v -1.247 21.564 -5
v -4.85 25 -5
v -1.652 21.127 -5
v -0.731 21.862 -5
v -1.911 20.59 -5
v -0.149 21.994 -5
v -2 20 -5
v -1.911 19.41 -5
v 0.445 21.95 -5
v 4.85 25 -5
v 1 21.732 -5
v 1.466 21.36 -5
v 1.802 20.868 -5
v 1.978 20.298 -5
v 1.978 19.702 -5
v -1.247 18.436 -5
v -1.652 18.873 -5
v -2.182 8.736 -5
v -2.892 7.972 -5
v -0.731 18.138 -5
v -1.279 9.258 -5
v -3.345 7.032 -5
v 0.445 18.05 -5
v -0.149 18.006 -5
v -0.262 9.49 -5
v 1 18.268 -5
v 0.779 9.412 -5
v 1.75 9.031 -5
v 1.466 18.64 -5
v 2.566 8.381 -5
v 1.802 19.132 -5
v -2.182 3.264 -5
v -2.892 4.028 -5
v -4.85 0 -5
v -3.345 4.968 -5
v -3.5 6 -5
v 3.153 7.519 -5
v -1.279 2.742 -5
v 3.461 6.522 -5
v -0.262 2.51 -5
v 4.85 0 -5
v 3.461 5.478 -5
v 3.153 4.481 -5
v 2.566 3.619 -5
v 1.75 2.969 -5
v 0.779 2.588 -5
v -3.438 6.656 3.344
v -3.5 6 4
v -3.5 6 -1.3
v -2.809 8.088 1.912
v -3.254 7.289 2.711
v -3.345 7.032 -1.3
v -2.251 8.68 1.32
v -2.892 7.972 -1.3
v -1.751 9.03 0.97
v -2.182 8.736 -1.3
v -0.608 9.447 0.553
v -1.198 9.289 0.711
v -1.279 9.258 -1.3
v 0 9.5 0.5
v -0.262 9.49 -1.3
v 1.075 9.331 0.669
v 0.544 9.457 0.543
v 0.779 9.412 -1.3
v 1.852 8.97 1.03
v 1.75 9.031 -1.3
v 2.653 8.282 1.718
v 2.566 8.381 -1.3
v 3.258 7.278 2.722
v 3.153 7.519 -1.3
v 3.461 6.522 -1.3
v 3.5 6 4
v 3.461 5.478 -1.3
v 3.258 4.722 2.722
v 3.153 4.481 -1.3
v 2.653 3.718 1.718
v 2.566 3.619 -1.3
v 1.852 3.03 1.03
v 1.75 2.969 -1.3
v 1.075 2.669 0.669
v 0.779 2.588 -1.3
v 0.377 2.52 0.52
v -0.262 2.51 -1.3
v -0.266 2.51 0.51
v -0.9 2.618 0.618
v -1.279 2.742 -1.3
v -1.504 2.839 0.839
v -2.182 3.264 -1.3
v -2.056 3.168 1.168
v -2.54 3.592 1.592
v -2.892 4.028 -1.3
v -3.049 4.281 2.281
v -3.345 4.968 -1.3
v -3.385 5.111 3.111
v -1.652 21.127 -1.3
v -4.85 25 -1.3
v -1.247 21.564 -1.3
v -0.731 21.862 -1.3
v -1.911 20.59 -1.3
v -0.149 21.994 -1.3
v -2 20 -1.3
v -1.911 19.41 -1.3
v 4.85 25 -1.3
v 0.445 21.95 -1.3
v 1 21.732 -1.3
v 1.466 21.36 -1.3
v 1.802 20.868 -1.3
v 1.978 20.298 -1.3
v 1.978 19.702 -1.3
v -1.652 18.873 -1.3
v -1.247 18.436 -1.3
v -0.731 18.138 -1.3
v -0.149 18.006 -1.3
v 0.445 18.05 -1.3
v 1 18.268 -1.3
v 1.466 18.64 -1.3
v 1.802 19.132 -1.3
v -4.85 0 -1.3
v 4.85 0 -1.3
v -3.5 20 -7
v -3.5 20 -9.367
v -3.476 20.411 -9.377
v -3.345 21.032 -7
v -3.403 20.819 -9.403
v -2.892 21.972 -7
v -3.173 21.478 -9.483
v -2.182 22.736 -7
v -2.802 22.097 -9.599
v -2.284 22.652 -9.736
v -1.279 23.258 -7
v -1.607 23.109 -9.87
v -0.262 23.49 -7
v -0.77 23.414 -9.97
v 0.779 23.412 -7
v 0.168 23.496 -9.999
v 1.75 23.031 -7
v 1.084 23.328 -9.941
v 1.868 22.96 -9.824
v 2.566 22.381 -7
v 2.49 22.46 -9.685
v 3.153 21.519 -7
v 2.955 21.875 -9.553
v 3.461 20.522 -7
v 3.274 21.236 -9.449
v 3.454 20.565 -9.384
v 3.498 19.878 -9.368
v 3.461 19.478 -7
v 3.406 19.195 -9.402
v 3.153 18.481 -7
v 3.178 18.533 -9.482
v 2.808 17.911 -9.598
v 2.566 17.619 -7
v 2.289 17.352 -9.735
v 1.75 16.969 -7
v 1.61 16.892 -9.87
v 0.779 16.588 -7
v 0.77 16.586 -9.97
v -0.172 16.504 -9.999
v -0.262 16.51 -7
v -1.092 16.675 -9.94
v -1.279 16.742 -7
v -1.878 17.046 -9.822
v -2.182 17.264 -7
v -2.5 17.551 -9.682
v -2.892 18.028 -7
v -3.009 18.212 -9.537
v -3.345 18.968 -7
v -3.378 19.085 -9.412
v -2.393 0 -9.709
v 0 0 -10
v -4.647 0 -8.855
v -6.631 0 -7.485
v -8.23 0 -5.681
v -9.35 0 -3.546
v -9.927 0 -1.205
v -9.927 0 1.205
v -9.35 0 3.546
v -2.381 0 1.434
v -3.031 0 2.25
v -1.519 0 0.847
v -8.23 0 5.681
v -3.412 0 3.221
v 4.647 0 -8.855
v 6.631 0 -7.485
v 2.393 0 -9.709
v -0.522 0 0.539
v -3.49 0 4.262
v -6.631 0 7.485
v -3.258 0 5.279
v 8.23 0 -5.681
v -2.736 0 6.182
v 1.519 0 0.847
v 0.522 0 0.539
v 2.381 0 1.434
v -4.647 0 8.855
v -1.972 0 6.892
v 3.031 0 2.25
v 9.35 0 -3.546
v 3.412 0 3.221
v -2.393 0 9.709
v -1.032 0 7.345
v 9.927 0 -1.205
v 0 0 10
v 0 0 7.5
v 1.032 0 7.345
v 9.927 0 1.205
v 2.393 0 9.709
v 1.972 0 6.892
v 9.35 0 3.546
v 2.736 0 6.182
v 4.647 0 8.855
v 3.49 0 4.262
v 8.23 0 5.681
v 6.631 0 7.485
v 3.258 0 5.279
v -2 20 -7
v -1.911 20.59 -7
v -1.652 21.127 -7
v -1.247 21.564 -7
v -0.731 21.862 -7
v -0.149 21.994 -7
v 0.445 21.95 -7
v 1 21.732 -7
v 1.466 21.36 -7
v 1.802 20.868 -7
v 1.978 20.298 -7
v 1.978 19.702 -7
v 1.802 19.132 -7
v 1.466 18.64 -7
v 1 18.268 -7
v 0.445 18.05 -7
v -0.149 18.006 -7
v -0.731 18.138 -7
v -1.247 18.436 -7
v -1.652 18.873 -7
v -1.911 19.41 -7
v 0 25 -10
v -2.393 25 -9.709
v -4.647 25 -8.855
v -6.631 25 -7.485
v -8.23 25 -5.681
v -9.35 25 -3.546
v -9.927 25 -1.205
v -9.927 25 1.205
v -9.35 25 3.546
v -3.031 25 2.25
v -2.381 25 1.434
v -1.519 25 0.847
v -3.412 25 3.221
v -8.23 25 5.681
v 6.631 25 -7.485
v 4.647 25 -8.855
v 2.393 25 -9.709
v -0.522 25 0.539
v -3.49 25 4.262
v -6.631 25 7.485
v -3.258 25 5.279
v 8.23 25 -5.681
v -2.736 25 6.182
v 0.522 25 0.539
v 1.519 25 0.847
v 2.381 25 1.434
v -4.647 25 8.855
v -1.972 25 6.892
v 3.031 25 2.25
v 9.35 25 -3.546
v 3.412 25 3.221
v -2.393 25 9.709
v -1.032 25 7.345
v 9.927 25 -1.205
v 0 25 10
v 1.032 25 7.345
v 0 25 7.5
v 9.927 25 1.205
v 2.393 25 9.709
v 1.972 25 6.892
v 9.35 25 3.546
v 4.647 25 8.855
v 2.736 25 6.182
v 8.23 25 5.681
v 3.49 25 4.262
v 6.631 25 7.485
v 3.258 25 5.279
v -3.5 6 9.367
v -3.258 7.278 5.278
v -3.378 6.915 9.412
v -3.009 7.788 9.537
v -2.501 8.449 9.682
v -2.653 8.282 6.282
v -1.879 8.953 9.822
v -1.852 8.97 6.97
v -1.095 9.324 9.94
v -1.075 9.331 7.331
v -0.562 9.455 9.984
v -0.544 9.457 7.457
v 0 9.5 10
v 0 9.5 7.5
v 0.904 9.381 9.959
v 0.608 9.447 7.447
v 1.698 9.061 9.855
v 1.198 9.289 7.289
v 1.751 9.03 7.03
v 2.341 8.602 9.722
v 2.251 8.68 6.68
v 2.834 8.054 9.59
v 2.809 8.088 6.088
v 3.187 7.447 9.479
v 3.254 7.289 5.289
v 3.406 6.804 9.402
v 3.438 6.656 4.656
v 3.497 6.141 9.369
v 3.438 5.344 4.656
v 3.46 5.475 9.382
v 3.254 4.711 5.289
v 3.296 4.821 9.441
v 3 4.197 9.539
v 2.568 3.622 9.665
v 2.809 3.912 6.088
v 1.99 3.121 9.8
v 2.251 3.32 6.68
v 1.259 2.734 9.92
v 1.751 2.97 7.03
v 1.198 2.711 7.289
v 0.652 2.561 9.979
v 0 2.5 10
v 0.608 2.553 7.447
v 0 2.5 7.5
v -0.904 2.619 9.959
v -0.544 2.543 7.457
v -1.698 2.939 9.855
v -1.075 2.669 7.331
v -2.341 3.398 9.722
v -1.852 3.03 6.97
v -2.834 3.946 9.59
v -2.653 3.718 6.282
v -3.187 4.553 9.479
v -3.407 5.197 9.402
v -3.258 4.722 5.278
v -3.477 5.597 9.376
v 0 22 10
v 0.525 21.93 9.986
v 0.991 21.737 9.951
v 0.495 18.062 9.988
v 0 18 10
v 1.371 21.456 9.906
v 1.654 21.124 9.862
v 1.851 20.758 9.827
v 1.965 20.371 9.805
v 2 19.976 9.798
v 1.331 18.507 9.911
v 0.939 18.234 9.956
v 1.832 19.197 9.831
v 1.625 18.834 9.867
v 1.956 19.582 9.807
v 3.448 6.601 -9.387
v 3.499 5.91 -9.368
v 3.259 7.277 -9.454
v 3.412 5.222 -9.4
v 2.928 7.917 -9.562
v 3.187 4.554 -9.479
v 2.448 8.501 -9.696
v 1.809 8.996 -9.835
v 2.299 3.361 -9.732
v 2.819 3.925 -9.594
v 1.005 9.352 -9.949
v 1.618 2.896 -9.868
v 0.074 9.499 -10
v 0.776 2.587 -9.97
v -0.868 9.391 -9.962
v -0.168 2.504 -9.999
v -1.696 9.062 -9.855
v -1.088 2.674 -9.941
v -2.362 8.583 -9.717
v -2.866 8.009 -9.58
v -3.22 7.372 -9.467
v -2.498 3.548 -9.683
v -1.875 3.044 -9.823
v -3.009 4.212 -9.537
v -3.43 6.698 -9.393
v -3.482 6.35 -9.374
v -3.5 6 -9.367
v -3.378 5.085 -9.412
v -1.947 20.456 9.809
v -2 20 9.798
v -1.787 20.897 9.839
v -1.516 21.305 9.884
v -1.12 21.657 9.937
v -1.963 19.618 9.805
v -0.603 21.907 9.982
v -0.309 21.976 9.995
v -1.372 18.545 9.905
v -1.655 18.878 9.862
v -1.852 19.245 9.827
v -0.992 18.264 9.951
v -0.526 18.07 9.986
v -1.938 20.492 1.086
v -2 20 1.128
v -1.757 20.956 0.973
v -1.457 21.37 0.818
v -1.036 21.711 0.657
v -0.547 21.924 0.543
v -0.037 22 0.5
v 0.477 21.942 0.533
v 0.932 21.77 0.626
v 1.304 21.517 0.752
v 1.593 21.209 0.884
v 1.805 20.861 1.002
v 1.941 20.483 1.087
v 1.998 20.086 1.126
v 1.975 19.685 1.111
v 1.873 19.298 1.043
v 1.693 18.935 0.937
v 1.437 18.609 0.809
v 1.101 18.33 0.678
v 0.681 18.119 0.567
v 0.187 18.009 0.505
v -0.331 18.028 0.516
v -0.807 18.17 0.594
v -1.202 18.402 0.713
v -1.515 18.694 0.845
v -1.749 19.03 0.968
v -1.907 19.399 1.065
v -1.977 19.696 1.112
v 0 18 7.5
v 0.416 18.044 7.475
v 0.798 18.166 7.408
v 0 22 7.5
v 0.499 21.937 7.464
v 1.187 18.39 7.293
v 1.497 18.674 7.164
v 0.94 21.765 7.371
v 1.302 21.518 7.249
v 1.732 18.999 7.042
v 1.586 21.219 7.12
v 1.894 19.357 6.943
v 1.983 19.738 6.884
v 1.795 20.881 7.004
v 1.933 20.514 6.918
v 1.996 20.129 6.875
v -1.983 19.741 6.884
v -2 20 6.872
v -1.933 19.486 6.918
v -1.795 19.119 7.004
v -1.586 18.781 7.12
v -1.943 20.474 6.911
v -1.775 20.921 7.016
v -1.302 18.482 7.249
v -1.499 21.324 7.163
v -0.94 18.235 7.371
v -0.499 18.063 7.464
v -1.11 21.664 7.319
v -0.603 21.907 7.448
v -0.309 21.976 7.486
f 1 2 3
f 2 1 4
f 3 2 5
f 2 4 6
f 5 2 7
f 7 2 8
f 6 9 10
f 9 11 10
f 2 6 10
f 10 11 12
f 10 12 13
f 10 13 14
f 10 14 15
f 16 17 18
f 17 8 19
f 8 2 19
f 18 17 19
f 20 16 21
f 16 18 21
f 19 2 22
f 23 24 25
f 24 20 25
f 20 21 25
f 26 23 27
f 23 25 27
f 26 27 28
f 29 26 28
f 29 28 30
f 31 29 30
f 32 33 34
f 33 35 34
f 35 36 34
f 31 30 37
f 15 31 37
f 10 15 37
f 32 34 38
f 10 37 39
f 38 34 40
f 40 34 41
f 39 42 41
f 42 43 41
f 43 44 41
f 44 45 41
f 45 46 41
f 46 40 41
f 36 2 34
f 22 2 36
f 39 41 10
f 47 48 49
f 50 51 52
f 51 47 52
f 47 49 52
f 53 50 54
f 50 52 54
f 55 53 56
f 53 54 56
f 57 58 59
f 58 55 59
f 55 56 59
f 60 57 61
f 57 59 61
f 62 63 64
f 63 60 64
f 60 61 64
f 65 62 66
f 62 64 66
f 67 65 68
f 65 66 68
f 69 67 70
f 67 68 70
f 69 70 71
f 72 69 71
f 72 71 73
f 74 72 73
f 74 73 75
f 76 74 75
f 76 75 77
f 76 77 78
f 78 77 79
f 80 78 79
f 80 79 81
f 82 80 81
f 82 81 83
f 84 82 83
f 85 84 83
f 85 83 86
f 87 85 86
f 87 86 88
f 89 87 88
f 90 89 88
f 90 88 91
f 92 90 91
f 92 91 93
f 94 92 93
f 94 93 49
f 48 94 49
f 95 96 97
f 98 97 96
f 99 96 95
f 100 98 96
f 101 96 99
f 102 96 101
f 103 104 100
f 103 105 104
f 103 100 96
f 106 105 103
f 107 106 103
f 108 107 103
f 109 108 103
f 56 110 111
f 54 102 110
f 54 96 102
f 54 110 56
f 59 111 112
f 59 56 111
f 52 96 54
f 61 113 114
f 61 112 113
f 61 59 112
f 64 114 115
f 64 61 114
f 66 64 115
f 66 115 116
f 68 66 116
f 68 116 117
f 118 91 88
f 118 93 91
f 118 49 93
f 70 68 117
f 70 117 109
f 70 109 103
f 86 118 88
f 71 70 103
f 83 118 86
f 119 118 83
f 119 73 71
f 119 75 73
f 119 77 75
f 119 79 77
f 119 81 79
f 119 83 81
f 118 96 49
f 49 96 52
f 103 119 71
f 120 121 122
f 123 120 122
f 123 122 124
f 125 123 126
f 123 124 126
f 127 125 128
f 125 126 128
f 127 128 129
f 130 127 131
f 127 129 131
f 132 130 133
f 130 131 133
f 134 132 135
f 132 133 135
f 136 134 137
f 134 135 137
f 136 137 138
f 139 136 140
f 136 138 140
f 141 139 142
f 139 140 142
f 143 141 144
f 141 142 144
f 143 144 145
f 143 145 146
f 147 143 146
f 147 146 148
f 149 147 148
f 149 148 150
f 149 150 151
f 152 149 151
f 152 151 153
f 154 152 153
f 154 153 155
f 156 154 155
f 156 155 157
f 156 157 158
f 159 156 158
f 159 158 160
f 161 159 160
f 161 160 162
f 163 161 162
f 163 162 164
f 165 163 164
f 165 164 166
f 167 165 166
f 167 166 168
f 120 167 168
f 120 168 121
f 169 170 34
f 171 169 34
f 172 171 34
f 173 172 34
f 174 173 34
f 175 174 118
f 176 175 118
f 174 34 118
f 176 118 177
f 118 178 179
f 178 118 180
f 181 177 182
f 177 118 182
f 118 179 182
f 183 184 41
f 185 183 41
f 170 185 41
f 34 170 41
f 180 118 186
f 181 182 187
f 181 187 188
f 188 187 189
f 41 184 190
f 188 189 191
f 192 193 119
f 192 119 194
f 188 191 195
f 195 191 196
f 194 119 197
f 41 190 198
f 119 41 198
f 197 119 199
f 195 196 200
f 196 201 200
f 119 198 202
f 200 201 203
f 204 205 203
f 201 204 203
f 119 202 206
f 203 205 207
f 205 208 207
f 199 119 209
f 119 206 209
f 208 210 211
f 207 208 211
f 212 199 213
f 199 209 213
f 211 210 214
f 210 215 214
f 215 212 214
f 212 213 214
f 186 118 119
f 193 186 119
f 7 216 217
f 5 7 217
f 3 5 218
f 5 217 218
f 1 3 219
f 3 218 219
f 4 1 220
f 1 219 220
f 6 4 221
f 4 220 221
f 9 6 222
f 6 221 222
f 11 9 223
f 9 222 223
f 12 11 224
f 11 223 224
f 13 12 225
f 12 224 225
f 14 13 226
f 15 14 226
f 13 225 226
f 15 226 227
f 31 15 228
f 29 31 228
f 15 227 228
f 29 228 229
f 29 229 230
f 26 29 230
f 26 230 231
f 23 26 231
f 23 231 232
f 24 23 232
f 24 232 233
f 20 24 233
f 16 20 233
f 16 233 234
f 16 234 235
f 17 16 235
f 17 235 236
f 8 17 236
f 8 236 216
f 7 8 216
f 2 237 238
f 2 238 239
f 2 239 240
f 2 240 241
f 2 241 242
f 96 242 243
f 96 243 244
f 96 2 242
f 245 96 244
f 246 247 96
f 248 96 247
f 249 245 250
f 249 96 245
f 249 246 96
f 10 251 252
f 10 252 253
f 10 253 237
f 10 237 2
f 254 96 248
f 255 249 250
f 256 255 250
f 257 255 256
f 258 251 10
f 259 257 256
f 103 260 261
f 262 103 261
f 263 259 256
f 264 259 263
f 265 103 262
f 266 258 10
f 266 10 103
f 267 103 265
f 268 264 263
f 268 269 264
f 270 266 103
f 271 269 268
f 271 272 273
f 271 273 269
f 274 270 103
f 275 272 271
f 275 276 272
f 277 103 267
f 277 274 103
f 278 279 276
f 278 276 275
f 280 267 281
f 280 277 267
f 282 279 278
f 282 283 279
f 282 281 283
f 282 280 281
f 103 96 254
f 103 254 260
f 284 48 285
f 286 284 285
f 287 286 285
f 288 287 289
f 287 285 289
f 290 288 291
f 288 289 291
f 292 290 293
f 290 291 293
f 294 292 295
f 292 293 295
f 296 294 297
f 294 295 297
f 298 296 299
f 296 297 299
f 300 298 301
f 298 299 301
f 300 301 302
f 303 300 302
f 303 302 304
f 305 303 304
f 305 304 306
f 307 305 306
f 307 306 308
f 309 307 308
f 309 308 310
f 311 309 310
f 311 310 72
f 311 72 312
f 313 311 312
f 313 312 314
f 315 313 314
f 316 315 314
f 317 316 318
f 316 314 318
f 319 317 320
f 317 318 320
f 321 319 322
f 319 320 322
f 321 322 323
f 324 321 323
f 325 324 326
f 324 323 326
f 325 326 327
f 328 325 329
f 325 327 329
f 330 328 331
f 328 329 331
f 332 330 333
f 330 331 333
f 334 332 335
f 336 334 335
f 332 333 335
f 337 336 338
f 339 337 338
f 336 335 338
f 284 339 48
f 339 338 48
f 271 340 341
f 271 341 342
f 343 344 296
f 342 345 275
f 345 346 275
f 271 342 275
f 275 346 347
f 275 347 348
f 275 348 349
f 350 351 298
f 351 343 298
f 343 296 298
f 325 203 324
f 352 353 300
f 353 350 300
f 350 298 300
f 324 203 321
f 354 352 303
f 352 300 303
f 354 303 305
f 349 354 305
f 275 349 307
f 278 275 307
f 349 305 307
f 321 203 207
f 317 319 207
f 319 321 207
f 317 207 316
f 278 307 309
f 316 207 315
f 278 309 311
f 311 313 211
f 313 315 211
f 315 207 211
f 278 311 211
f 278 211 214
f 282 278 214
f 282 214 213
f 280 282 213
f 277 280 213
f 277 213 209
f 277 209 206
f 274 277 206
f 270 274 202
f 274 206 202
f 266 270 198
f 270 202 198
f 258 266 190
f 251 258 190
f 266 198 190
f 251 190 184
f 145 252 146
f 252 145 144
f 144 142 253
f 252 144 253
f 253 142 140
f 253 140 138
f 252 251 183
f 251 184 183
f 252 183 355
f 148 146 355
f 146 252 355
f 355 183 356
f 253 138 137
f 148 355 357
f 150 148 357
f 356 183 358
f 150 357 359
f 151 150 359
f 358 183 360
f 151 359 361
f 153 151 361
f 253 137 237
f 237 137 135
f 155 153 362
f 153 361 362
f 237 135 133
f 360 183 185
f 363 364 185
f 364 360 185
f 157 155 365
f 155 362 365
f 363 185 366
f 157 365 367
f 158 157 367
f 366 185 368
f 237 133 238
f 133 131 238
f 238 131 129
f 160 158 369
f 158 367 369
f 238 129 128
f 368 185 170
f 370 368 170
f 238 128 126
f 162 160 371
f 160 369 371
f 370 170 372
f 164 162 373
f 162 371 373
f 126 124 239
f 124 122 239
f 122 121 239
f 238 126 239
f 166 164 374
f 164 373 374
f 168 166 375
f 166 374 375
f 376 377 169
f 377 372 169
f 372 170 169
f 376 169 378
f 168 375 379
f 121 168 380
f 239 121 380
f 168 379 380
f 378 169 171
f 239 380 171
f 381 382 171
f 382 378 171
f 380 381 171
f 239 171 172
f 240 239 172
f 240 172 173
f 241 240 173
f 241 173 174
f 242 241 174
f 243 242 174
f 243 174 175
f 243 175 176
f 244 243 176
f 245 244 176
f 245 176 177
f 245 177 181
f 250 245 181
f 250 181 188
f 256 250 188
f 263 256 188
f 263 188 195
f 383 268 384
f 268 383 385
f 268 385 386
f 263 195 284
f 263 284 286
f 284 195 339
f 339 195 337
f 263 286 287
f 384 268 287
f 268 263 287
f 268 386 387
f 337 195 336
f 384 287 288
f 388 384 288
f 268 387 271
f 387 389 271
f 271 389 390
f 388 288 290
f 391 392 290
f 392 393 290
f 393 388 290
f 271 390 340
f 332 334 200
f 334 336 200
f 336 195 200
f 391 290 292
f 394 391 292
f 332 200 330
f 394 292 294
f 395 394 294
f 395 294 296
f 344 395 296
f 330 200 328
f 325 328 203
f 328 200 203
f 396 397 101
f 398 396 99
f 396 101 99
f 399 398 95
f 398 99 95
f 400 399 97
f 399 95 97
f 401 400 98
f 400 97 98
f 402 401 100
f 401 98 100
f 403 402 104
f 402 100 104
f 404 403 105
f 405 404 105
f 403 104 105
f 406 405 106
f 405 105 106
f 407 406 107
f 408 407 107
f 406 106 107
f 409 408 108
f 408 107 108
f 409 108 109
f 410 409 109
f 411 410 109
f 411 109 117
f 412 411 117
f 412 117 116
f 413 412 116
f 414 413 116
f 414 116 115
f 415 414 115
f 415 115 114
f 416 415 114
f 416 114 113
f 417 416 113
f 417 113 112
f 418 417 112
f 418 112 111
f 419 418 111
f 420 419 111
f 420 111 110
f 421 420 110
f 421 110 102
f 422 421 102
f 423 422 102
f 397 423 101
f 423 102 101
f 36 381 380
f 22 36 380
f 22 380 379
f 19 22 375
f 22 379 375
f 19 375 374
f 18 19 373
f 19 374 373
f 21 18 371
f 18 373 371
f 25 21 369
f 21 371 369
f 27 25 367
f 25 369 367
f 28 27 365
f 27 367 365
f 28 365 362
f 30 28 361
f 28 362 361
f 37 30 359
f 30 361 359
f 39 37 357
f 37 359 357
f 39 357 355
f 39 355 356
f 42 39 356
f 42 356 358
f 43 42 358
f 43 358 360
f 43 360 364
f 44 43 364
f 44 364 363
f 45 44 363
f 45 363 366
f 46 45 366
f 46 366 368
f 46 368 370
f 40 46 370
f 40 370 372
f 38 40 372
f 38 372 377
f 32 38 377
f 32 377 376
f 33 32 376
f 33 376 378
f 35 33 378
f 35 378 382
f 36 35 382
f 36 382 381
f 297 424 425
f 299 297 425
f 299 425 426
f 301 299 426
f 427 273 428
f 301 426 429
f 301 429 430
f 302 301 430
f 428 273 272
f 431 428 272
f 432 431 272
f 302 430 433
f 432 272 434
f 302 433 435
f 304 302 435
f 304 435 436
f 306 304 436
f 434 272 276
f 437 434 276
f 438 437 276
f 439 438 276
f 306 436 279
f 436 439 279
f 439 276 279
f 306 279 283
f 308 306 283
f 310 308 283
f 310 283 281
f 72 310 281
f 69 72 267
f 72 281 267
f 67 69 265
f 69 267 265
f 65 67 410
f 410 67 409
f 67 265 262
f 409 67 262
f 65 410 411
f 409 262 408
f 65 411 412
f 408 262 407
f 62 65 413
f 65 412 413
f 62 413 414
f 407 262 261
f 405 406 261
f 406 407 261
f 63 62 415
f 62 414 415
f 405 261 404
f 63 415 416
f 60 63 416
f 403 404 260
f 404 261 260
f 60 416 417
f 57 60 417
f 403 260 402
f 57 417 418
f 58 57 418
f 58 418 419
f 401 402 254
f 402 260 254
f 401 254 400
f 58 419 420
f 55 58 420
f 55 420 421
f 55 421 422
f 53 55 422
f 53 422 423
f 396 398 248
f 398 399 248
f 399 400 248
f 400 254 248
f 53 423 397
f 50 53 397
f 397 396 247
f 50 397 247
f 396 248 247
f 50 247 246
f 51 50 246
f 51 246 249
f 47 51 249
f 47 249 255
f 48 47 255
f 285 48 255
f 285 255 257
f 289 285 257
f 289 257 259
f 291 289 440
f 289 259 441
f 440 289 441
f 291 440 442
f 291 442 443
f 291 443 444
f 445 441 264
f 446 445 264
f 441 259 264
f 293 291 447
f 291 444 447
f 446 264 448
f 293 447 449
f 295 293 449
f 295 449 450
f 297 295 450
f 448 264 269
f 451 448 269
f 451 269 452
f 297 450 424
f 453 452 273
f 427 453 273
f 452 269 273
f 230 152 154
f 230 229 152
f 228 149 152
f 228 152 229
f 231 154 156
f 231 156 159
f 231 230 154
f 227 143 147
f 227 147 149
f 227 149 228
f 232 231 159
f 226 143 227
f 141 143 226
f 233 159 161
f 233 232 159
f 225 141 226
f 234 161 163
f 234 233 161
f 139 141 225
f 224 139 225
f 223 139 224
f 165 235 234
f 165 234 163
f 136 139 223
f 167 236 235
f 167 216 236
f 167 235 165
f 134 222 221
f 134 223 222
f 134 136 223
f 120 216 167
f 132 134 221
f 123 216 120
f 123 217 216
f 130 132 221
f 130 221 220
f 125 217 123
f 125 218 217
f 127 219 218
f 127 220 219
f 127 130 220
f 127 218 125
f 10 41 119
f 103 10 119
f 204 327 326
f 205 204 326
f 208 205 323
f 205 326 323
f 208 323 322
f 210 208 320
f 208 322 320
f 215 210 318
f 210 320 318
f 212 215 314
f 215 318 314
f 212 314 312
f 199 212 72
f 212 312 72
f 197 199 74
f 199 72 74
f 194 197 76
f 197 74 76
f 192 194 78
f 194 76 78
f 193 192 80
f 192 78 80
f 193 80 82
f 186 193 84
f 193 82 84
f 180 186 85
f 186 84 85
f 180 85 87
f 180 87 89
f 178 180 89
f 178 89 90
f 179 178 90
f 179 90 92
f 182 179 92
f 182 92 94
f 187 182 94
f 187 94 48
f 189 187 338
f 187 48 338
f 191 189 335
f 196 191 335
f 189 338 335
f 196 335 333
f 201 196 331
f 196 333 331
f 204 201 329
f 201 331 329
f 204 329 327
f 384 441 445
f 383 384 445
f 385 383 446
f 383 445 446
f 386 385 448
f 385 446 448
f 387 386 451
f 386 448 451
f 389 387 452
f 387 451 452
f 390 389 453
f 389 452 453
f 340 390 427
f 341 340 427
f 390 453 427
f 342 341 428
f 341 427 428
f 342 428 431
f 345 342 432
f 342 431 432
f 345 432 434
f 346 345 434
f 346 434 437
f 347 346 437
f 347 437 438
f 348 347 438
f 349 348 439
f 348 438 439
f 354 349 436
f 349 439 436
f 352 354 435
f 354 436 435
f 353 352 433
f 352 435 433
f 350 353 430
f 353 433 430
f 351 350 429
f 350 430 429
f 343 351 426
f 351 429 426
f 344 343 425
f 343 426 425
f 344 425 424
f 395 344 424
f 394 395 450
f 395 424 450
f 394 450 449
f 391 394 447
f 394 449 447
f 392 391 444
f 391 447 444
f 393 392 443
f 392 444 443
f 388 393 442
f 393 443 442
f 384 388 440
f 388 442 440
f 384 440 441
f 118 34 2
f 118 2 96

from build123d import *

# Parameters (mm, degrees)
CROQUIS1_R              = 10
SALIENTE_EXTRUIR1_DEPTH = 25
CORTAR_EXTRUIR1_REACH   = 30.723
CROQUIS3_R              = 3.5
CROQUIS5_R              = 3.5
CROQUIS5_R_2            = 2
CORTAR_EXTRUIR3_DEPTH   = 34.541019662
CORTAR_EXTRUIR4_REACH   = 30.723
CROQUIS6_W              = 9.7
CROQUIS6_H              = 3.7
CROQUIS7_R              = 3.5
CORTAR_EXTRUIR5_DEPTH   = 3


with BuildPart() as part:
    # Croquis1 → Saliente-Extruir1 (new body)
    with BuildSketch(Plane(origin=(0, 0, 0), x_dir=(1, 0, 0), z_dir=(0, 1, 0))):
        with Locations(Location((0, 0, 0), (0, 0, 270))):
            Circle(CROQUIS1_R)
    extrude(amount=SALIENTE_EXTRUIR1_DEPTH)

    # Croquis3 → Cortar-Extruir1 (cut, up to next)
    with BuildSketch(Plane(origin=(0, 25, 0), x_dir=(1, 0, 0), z_dir=(0, 1, 0)), mode=Mode.PRIVATE) as cortar_extruir1_sk1:
        with Locations(Location((0, -4, 0), (0, 0, 270))):
            Circle(CROQUIS3_R)
    cortar_extruir1_tool1 = extrude(cortar_extruir1_sk1.sketch, amount=-CORTAR_EXTRUIR1_REACH, mode=Mode.PRIVATE) & part.part
    add(cortar_extruir1_tool1.solids().sort_by_distance((0, 25, 4))[0], mode=Mode.SUBTRACT)

    # Croquis5 → Cortar-Extruir3 (cut, through all)
    with BuildSketch(Plane(origin=(0, 0, -10), x_dir=(-1, 0, 0), z_dir=(0, 0, -1))):
        with Locations((0, 6)):
            Circle(CROQUIS5_R)
        with Locations((0, 20)):
            Circle(CROQUIS5_R_2)
    extrude(amount=-CORTAR_EXTRUIR3_DEPTH, mode=Mode.SUBTRACT)

    # Croquis6 → Cortar-Extruir4 (cut, up to next)
    with BuildSketch(Plane.XZ, mode=Mode.PRIVATE) as cortar_extruir4_sk1:
        with Locations((0, -3.15)):
            Rectangle(CROQUIS6_W, CROQUIS6_H)
    cortar_extruir4_tool1 = extrude(cortar_extruir4_sk1.sketch, amount=-CORTAR_EXTRUIR4_REACH, mode=Mode.PRIVATE) & part.part
    add(cortar_extruir4_tool1.solids().sort_by_distance((0, 0, -3.15))[0], mode=Mode.SUBTRACT)

    # Croquis7 → Cortar-Extruir5 (cut)
    with BuildSketch(Plane(origin=(0, 0, -10), x_dir=(-1, 0, 0), z_dir=(0, 0, -1))):
        with Locations((0, 20)):
            Circle(CROQUIS7_R)
    extrude(amount=-CORTAR_EXTRUIR5_DEPTH, mode=Mode.SUBTRACT)


solid = part.part
